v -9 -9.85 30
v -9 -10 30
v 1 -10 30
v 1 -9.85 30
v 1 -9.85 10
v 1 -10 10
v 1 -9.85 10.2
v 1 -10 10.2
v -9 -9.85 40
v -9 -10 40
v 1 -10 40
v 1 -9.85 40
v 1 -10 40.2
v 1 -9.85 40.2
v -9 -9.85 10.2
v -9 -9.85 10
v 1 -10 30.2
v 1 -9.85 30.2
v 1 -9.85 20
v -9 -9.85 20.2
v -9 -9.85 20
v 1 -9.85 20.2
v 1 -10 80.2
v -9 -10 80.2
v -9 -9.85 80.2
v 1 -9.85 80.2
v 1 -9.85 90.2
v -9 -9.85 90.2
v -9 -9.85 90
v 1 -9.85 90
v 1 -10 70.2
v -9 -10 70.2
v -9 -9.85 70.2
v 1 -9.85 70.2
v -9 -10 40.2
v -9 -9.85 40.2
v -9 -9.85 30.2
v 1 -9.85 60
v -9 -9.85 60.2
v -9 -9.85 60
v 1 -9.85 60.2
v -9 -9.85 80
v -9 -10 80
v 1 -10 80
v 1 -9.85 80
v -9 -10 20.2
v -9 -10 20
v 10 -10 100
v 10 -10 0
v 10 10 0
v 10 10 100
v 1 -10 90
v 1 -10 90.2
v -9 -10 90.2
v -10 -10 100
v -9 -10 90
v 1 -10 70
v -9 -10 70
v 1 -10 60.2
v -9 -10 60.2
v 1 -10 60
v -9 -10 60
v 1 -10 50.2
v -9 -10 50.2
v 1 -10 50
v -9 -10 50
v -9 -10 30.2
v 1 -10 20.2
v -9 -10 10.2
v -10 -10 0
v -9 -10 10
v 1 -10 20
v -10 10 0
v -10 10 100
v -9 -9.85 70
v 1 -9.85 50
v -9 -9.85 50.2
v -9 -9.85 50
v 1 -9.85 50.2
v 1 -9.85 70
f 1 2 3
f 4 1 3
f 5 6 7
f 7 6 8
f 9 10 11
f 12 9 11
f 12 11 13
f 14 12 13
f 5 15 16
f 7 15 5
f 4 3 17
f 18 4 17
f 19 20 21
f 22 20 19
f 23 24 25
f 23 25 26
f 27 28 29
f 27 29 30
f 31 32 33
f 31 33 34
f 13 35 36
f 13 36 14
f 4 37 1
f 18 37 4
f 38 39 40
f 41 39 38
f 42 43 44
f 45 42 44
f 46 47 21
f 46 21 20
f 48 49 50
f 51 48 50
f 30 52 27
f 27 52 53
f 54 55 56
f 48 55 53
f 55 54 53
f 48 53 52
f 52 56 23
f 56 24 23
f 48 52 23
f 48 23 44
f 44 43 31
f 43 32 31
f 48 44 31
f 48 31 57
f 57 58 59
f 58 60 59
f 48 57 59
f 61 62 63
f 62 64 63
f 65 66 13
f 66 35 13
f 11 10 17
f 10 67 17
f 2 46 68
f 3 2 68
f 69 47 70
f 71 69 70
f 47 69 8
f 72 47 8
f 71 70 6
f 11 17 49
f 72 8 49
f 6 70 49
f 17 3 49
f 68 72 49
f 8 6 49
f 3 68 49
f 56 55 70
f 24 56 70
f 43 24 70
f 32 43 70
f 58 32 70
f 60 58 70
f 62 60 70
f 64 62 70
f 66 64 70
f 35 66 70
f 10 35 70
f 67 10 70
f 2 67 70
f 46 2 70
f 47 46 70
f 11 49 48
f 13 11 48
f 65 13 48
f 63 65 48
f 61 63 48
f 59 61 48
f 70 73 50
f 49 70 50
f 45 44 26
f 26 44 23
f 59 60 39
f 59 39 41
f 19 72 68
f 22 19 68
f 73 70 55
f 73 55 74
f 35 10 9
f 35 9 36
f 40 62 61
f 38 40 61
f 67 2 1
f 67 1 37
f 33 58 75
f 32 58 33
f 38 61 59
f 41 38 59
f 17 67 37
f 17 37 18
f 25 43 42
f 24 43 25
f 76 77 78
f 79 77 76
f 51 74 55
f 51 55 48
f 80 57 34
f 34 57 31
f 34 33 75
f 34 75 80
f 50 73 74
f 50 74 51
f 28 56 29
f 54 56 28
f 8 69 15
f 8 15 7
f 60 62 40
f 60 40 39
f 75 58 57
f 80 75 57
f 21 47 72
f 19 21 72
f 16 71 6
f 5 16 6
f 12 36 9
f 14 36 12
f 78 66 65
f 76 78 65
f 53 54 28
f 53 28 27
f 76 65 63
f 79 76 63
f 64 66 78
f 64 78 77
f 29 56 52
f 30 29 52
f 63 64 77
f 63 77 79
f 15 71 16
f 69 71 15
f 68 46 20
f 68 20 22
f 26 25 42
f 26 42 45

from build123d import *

# Parameters (mm, degrees)
F0_W     = 20
F0_H     = 20
F1_DEPTH = 100
F2_W     = 10
F2_H     = 0.2
F3_DEPTH = 0.15


with BuildPart() as f1:
    # F0 (on Top) → F1 (new body)
    with BuildSketch(Plane.XY):
        Rectangle(F0_W, F0_H)
    extrude(amount=F1_DEPTH)

    # F2 (on face) → F3 (cut)
    with BuildSketch(Plane.XZ.offset(10)):
        with Locations((-4, 10.1)):
            Rectangle(F2_W, F2_H)
        with Locations((-4, 20.1)):
            Rectangle(F2_W, F2_H)
        with Locations((-4, 30.1)):
            Rectangle(F2_W, F2_H)
        with Locations((-4, 40.1)):
            Rectangle(F2_W, F2_H)
        with Locations((-4, 50.1)):
            Rectangle(F2_W, F2_H)
        with Locations((-4, 60.1)):
            Rectangle(F2_W, F2_H)
        with Locations((-4, 70.1)):
            Rectangle(F2_W, F2_H)
        with Locations((-4, 80.1)):
            Rectangle(F2_W, F2_H)
        with Locations((-4, 90.1)):
            Rectangle(F2_W, F2_H)
        with Locations((-4, 100.1)):
            Rectangle(F2_W, F2_H)
    extrude(amount=-F3_DEPTH, mode=Mode.SUBTRACT)


solid = f1.part
